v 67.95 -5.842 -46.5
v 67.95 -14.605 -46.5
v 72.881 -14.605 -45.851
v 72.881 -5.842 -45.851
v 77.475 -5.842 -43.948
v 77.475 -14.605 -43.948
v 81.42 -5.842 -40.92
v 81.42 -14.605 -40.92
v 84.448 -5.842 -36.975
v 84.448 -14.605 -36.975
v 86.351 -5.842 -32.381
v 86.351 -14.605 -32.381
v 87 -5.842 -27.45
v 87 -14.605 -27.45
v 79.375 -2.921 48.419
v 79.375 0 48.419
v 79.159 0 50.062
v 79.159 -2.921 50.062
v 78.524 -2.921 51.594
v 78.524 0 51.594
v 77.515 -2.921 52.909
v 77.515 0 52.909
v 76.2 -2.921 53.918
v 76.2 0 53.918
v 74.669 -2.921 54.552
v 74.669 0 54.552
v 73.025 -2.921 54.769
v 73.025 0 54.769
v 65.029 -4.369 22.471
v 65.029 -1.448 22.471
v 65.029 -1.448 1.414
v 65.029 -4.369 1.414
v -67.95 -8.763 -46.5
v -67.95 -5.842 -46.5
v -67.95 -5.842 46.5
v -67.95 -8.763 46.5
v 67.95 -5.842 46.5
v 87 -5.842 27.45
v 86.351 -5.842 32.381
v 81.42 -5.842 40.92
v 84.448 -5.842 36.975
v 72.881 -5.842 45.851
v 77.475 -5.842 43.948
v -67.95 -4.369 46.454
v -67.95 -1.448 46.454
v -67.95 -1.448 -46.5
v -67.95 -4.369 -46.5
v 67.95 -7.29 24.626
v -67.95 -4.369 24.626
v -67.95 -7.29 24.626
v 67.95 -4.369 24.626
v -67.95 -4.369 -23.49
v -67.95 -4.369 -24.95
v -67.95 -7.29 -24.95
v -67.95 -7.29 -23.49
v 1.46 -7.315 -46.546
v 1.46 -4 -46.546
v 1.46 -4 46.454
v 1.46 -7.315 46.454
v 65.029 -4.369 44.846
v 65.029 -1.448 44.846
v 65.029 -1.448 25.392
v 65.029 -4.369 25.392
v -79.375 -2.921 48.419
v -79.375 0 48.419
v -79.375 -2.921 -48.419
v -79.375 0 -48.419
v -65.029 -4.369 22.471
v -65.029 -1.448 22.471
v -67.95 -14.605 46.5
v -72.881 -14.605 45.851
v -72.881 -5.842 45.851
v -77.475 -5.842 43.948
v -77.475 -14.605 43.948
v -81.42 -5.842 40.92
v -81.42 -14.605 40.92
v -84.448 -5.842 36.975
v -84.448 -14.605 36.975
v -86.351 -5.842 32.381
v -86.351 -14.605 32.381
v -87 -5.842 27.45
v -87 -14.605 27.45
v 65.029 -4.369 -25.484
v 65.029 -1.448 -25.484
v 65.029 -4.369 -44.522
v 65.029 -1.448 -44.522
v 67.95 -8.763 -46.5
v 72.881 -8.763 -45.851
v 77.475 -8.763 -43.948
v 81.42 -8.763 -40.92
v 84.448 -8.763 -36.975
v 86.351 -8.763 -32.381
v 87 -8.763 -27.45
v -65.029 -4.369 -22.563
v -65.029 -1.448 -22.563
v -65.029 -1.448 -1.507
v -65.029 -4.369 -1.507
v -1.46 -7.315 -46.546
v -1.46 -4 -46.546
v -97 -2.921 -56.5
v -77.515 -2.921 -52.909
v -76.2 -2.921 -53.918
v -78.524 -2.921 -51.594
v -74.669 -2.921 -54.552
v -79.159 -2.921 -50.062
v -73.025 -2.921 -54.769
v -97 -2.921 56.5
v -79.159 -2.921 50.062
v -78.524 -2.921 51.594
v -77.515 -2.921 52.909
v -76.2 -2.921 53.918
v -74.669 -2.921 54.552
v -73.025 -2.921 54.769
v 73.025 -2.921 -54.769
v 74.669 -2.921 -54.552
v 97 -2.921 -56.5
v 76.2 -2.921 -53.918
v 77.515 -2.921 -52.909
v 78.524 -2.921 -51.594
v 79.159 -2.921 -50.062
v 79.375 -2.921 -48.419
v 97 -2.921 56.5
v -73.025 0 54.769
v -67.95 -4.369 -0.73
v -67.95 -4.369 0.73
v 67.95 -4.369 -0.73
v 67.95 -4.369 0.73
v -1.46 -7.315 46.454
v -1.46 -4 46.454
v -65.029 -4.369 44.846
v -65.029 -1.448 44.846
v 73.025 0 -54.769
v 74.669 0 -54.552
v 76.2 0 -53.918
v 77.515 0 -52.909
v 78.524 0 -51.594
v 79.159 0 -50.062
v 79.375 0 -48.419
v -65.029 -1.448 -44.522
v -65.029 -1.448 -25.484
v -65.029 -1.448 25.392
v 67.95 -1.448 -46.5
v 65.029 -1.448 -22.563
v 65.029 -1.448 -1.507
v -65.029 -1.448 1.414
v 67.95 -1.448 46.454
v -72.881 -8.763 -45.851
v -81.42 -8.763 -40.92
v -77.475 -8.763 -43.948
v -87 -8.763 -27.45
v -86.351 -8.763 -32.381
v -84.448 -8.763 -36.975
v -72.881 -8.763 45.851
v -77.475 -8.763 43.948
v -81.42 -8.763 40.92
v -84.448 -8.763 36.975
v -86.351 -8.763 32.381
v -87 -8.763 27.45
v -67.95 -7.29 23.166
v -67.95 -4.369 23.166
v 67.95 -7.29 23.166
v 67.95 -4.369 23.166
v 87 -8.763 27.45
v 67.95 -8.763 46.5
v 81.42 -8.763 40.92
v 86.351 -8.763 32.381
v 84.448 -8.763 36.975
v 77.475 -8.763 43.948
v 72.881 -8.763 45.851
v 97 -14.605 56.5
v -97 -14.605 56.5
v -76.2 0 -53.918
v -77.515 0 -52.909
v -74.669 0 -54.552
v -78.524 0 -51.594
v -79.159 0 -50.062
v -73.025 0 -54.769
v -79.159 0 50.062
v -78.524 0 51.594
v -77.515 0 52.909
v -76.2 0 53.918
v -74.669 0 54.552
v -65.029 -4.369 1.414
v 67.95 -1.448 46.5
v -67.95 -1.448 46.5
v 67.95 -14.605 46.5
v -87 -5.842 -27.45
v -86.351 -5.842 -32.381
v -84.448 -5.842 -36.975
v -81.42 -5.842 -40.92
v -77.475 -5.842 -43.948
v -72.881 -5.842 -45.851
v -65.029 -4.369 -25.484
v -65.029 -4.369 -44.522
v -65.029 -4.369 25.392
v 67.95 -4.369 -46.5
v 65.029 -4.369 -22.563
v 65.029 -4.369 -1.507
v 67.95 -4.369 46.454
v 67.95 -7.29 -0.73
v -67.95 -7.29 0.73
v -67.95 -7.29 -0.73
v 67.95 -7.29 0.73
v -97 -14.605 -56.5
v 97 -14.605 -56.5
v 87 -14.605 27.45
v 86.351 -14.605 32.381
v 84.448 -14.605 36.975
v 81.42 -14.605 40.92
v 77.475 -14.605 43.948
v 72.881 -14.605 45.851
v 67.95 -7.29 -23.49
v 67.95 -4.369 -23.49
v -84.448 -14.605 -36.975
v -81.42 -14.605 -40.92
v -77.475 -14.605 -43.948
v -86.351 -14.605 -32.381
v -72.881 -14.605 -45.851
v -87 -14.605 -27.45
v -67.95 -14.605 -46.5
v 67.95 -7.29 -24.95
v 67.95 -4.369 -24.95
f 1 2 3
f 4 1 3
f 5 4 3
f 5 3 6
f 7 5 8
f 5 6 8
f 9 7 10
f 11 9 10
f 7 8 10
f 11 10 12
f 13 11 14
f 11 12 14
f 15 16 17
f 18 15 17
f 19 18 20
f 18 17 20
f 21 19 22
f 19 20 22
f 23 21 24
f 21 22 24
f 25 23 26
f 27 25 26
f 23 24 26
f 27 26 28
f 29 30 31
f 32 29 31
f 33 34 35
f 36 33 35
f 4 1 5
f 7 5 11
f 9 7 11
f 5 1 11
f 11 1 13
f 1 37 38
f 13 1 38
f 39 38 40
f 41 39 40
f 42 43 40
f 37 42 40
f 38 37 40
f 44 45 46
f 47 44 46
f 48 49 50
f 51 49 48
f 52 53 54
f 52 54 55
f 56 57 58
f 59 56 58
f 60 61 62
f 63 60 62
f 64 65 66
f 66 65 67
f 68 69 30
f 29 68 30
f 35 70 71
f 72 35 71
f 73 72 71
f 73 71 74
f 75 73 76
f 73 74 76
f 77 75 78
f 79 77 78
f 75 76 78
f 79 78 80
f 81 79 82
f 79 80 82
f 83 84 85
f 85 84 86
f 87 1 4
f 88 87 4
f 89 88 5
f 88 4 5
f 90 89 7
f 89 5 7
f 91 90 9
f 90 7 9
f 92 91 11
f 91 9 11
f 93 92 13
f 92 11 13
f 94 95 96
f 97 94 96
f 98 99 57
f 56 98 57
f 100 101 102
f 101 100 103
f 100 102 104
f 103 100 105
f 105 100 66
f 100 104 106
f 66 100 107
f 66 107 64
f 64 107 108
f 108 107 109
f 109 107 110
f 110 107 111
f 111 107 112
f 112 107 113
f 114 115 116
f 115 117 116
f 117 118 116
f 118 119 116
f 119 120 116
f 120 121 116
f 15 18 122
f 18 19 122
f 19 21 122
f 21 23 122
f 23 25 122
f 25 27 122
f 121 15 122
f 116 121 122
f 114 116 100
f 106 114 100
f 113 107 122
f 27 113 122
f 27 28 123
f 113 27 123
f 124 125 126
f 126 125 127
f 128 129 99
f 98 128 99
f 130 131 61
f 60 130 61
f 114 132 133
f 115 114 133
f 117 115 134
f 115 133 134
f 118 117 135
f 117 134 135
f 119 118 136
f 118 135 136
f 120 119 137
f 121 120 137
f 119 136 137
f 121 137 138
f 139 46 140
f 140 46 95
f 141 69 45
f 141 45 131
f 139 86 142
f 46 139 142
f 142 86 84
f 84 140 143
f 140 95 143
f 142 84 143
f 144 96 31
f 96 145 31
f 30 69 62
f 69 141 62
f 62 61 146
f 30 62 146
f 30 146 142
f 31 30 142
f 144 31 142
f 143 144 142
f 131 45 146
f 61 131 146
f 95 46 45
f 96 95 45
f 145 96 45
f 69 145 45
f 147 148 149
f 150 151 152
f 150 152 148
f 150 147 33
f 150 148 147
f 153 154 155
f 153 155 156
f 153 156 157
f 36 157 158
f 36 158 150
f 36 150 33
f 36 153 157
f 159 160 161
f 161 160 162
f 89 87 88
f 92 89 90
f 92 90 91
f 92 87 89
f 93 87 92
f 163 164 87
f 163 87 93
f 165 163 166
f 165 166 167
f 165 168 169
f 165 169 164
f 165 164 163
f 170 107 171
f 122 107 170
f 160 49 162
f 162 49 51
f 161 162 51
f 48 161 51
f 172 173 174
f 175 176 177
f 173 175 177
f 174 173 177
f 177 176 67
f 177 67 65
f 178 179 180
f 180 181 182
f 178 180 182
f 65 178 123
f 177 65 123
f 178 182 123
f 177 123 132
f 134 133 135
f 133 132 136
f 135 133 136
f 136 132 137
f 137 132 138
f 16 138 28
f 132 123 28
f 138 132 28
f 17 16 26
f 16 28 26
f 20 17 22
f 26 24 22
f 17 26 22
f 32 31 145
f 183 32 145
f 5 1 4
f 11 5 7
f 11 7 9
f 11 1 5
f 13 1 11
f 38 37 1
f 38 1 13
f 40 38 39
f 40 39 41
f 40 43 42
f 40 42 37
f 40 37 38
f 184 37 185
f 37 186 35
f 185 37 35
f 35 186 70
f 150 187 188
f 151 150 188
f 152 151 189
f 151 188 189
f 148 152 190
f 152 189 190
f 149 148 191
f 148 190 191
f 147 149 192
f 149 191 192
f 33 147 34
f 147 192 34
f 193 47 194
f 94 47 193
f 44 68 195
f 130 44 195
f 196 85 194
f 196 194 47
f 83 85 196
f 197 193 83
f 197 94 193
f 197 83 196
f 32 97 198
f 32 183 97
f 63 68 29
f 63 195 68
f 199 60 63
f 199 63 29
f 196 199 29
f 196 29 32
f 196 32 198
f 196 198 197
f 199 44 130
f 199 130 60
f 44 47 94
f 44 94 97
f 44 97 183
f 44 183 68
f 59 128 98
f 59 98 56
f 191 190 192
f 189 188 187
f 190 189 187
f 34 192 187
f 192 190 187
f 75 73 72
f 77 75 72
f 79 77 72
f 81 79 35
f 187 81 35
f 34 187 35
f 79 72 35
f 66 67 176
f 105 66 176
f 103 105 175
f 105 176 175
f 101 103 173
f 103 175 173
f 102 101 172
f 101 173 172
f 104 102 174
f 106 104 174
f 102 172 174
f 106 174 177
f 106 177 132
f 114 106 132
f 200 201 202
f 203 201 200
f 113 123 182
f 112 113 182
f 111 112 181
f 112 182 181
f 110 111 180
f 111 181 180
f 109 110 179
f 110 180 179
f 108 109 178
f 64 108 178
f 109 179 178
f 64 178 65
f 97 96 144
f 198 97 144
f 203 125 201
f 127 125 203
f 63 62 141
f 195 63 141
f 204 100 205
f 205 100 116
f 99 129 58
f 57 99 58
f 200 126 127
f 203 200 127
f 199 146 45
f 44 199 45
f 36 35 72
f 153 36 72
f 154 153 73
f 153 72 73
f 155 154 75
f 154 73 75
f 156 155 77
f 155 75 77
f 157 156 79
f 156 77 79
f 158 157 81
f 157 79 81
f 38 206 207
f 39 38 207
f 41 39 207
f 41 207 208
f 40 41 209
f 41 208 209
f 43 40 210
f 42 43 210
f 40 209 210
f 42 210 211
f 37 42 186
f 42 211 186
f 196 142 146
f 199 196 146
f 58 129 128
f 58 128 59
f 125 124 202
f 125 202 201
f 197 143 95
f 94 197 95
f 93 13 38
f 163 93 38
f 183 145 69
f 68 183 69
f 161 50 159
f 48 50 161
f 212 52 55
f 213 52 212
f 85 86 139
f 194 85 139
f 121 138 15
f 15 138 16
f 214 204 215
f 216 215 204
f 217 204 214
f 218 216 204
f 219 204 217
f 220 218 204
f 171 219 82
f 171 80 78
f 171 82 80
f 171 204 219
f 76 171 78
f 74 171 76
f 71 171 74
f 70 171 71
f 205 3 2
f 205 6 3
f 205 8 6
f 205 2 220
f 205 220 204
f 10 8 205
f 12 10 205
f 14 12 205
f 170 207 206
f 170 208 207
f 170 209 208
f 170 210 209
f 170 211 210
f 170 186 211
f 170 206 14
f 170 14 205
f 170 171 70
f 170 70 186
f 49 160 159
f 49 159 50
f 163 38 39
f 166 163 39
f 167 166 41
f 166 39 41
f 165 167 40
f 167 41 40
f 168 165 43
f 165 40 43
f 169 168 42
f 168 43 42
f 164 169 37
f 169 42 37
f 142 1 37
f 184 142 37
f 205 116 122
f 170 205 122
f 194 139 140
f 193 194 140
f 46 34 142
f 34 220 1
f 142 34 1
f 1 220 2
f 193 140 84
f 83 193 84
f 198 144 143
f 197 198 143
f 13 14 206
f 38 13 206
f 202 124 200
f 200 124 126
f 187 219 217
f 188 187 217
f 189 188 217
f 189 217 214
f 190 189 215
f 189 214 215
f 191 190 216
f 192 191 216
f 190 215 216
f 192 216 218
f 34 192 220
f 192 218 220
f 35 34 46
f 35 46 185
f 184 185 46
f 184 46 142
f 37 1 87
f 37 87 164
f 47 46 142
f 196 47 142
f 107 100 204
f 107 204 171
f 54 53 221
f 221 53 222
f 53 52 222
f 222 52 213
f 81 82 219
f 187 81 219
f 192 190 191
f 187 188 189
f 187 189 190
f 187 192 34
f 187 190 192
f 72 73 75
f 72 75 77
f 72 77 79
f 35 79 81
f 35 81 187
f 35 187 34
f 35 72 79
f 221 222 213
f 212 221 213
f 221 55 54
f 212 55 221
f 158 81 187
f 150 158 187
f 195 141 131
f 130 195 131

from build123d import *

# Parameters (mm, degrees)
F1_DEPTH  = 2.921
F2_W      = 194
F2_H      = 113
F3_DEPTH  = 11.684
F5_DEPTH  = 8.763
F6_W      = 135.9
F6_H      = 93
F7_DEPTH  = 4.3942
F9_W      = 2.921
F9_H      = 19.4544830424
F9_H_2    = 21.0566
F9_H_3    = 19.0374144417
F9_H_4    = 2.921
F9_H_5    = 1.6074169576
F9_H_6    = 2.0244855583
F10_DEPTH = 3.3147
F11_W     = 63.5685
F11_H     = 2.921
F11_H_2   = 1.9781446026
F11_W_2   = 2.921
F11_H_3   = 1.6074169576
F12_DEPTH = 2.921
F13_W     = 135.9
F13_H     = 1.4605
F14_DEPTH = 2.921
F15_DEPTH = 2.921


with BuildPart() as f1:
    # F0 (on Front) → F1 (new body)
    with BuildSketch(Plane.XZ):
        with BuildLine():
            ThreePointArc((79.375, 48.41875), (77.5151280605, 52.9088780605), (73.025, 54.76875))
            Line((73.025, 54.76875), (-73.025, 54.76875))
            ThreePointArc((-73.025, 54.76875), (-77.5151280605, 52.9088780605), (-79.375, 48.41875))
            Line((-79.375, 48.41875), (-79.375, -48.41875))
            ThreePointArc((-79.375, -48.41875), (-77.5151280605, -52.9088780605), (-73.025, -54.76875))
            Line((-73.025, -54.76875), (73.025, -54.76875))
            ThreePointArc((73.025, -54.76875), (77.5151280605, -52.9088780605), (79.375, -48.41875))
            Line((79.375, -48.41875), (79.375, 48.41875))
        make_face()
    extrude(amount=F1_DEPTH)

    # F2 (on face) → F3 (join)
    with BuildSketch(Plane.XZ.offset(2.921)):
        Rectangle(F2_W, F2_H)
    extrude(amount=F3_DEPTH)

    # F4 (on face) → F5 (cut)
    with BuildSketch(Plane.XZ.offset(14.605)):
        with BuildLine():
            Line((67.95, 46.5), (-67.95, 46.5))
            ThreePointArc((-67.95, 46.5), (-81.4203841816, 40.9203841816), (-87, 27.45))
            Line((-87, 27.45), (-87, -27.45))
            ThreePointArc((-87, -27.45), (-81.4203841816, -40.9203841816), (-67.95, -46.5))
            Line((-67.95, -46.5), (67.95, -46.5))
            ThreePointArc((67.95, -46.5), (81.4203841816, -40.9203841816), (87, -27.45))
            Line((87, -27.45), (87, 27.45))
            ThreePointArc((87, 27.45), (81.4203841816, 40.9203841816), (67.95, 46.5))
        make_face()
    extrude(amount=-F5_DEPTH, mode=Mode.SUBTRACT)

    # F6 (on face) → F7 (cut)
    with BuildSketch(Plane.XZ.offset(5.842)):
        Rectangle(F6_W, F6_H)
    extrude(amount=-F7_DEPTH, mode=Mode.SUBTRACT)


with BuildPart() as f10:
    # F9 (on offset) → F10 (new body)
    with BuildSketch(Plane.XZ.offset(4.0005)):
        with Locations((0, 35.1190005656)):
            Rectangle(F9_W, F9_H)
        with Locations((0, 11.9424590444)):
            Rectangle(F9_W, F9_H_2)
        with Locations((0, -12.0351409556)):
            Rectangle(F9_W, F9_H_2)
        with Locations((0, -35.0031481765)):
            Rectangle(F9_W, F9_H_3)
        with Locations((0, 23.9312590444)):
            Rectangle(F9_W, F9_H_4)
        with Locations((0, -0.0463409556)):
            Rectangle(F9_W, F9_H_4)
        with Locations((0, -24.0239409556)):
            Rectangle(F9_W, F9_H_4)
        with Locations((0, 45.6499505656)):
            Rectangle(F9_W, F9_H_5)
        with Locations((0, -45.5340981765)):
            Rectangle(F9_W, F9_H_6)
    extrude(amount=F10_DEPTH)


with BuildPart() as f12:
    # F11 (on face) → F12 (new body)
    with BuildSketch(Plane.XZ.offset(1.4478)):
        with Locations((-33.24475, 23.9312590444)):
            Rectangle(F11_W, F11_H)
        with Locations((-33.24475, -0.0463409556)):
            Rectangle(F11_W, F11_H)
        with Locations((-33.24475, -24.0239409556)):
            Rectangle(F11_W, F11_H)
        with Locations((-33.24475, -45.5109276987)):
            Rectangle(F11_W, F11_H_2)
        with Locations((-66.4895, -45.5109276987)):
            Rectangle(F11_W_2, F11_H_2)
        with Locations((0, -45.5109276987)):
            Rectangle(F11_W_2, F11_H_2)
        with Locations((33.24475, -45.5109276987)):
            Rectangle(F11_W, F11_H_2)
        with Locations((33.24475, -24.0239409556)):
            Rectangle(F11_W, F11_H)
        with Locations((33.24475, -0.0463409556)):
            Rectangle(F11_W, F11_H)
        with Locations((33.24475, 23.9312590444)):
            Rectangle(F11_W, F11_H)
        Polygon((67.95, 44.8462420868), (65.029, 44.8462420868), (65.029, 25.3917590444), (65.029, 22.4707590444), (65.029, 1.4141590444), (65.029, -1.5068409556), (65.029, -22.5634409556), (65.029, -25.4844409556), (65.029, -44.5218553974), (67.95, -44.5218553974), align=None)
        with Locations((33.24475, 45.6499505656)):
            Rectangle(F11_W, F11_H_3)
        with Locations((-33.24475, 45.6499505656)):
            Rectangle(F11_W, F11_H_3)
        with Locations((0, 23.9312590444)):
            Rectangle(F11_W_2, F11_H)
        with Locations((0, 45.6499505656)):
            Rectangle(F11_W_2, F11_H_3)
        with Locations((0, -0.0463409556)):
            Rectangle(F11_W_2, F11_H)
        with Locations((0, -24.0239409556)):
            Rectangle(F11_W_2, F11_H)
        with Locations((66.4895, -45.5109276987)):
            Rectangle(F11_W_2, F11_H_2)
        with Locations((66.4895, 45.6499505656)):
            Rectangle(F11_W_2, F11_H_3)
        with Locations((-66.4895, 45.6499505656)):
            Rectangle(F11_W_2, F11_H_3)
        Polygon((-65.029, 25.3917590444), (-65.029, 44.8462420868), (-67.95, 44.8462420868), (-67.95, -44.5218553974), (-65.029, -44.5218553974), (-65.029, -25.4844409556), (-65.029, -22.5634409556), (-65.029, -1.5068409556), (-65.029, 1.4141590444), (-65.029, 22.4707590444), align=None)
    extrude(amount=F12_DEPTH)


with BuildPart() as f14:
    # F13 (on face) → F14 (new body)
    with BuildSketch(Plane.XZ.offset(4.3688)):
        with Locations((0, 23.8960850984)):
            Rectangle(F13_W, F13_H)
    extrude(amount=F14_DEPTH)


with BuildPart() as f14b:
    # F13 (on face) → F14, piece 2 (new body)
    with BuildSketch(Plane.XZ.offset(4.3688)):
        Rectangle(F13_W, F13_H)
    extrude(amount=F14_DEPTH)


with BuildPart() as f14c:
    # F13 (on face) → F14, piece 3 (new body)
    with BuildSketch(Plane.XZ.offset(4.3688)):
        with Locations((0, -24.2199655622)):
            Rectangle(F13_W, F13_H)
    extrude(amount=F14_DEPTH)


with BuildPart() as f15:
    # F15 (new): a face of the model
    f15_faces = [f1.part.faces().sort_by_distance(p)[0] for p in [
        (-76.9670290883, -5.842, 0),
    ]]
    extrude(f15_faces, amount=F15_DEPTH)


with BuildPart() as f15b:
    # F15#2 (new): a face of the model
    f15_2_faces = [f1.part.faces().sort_by_distance(p)[0] for p in [
        (76.9670290883, -5.842, 0),
    ]]
    extrude(f15_2_faces, amount=F15_DEPTH)


solid = Compound([f1.part, f10.part, f12.part, f14.part, f14b.part, f14c.part, f15.part, f15b.part])
